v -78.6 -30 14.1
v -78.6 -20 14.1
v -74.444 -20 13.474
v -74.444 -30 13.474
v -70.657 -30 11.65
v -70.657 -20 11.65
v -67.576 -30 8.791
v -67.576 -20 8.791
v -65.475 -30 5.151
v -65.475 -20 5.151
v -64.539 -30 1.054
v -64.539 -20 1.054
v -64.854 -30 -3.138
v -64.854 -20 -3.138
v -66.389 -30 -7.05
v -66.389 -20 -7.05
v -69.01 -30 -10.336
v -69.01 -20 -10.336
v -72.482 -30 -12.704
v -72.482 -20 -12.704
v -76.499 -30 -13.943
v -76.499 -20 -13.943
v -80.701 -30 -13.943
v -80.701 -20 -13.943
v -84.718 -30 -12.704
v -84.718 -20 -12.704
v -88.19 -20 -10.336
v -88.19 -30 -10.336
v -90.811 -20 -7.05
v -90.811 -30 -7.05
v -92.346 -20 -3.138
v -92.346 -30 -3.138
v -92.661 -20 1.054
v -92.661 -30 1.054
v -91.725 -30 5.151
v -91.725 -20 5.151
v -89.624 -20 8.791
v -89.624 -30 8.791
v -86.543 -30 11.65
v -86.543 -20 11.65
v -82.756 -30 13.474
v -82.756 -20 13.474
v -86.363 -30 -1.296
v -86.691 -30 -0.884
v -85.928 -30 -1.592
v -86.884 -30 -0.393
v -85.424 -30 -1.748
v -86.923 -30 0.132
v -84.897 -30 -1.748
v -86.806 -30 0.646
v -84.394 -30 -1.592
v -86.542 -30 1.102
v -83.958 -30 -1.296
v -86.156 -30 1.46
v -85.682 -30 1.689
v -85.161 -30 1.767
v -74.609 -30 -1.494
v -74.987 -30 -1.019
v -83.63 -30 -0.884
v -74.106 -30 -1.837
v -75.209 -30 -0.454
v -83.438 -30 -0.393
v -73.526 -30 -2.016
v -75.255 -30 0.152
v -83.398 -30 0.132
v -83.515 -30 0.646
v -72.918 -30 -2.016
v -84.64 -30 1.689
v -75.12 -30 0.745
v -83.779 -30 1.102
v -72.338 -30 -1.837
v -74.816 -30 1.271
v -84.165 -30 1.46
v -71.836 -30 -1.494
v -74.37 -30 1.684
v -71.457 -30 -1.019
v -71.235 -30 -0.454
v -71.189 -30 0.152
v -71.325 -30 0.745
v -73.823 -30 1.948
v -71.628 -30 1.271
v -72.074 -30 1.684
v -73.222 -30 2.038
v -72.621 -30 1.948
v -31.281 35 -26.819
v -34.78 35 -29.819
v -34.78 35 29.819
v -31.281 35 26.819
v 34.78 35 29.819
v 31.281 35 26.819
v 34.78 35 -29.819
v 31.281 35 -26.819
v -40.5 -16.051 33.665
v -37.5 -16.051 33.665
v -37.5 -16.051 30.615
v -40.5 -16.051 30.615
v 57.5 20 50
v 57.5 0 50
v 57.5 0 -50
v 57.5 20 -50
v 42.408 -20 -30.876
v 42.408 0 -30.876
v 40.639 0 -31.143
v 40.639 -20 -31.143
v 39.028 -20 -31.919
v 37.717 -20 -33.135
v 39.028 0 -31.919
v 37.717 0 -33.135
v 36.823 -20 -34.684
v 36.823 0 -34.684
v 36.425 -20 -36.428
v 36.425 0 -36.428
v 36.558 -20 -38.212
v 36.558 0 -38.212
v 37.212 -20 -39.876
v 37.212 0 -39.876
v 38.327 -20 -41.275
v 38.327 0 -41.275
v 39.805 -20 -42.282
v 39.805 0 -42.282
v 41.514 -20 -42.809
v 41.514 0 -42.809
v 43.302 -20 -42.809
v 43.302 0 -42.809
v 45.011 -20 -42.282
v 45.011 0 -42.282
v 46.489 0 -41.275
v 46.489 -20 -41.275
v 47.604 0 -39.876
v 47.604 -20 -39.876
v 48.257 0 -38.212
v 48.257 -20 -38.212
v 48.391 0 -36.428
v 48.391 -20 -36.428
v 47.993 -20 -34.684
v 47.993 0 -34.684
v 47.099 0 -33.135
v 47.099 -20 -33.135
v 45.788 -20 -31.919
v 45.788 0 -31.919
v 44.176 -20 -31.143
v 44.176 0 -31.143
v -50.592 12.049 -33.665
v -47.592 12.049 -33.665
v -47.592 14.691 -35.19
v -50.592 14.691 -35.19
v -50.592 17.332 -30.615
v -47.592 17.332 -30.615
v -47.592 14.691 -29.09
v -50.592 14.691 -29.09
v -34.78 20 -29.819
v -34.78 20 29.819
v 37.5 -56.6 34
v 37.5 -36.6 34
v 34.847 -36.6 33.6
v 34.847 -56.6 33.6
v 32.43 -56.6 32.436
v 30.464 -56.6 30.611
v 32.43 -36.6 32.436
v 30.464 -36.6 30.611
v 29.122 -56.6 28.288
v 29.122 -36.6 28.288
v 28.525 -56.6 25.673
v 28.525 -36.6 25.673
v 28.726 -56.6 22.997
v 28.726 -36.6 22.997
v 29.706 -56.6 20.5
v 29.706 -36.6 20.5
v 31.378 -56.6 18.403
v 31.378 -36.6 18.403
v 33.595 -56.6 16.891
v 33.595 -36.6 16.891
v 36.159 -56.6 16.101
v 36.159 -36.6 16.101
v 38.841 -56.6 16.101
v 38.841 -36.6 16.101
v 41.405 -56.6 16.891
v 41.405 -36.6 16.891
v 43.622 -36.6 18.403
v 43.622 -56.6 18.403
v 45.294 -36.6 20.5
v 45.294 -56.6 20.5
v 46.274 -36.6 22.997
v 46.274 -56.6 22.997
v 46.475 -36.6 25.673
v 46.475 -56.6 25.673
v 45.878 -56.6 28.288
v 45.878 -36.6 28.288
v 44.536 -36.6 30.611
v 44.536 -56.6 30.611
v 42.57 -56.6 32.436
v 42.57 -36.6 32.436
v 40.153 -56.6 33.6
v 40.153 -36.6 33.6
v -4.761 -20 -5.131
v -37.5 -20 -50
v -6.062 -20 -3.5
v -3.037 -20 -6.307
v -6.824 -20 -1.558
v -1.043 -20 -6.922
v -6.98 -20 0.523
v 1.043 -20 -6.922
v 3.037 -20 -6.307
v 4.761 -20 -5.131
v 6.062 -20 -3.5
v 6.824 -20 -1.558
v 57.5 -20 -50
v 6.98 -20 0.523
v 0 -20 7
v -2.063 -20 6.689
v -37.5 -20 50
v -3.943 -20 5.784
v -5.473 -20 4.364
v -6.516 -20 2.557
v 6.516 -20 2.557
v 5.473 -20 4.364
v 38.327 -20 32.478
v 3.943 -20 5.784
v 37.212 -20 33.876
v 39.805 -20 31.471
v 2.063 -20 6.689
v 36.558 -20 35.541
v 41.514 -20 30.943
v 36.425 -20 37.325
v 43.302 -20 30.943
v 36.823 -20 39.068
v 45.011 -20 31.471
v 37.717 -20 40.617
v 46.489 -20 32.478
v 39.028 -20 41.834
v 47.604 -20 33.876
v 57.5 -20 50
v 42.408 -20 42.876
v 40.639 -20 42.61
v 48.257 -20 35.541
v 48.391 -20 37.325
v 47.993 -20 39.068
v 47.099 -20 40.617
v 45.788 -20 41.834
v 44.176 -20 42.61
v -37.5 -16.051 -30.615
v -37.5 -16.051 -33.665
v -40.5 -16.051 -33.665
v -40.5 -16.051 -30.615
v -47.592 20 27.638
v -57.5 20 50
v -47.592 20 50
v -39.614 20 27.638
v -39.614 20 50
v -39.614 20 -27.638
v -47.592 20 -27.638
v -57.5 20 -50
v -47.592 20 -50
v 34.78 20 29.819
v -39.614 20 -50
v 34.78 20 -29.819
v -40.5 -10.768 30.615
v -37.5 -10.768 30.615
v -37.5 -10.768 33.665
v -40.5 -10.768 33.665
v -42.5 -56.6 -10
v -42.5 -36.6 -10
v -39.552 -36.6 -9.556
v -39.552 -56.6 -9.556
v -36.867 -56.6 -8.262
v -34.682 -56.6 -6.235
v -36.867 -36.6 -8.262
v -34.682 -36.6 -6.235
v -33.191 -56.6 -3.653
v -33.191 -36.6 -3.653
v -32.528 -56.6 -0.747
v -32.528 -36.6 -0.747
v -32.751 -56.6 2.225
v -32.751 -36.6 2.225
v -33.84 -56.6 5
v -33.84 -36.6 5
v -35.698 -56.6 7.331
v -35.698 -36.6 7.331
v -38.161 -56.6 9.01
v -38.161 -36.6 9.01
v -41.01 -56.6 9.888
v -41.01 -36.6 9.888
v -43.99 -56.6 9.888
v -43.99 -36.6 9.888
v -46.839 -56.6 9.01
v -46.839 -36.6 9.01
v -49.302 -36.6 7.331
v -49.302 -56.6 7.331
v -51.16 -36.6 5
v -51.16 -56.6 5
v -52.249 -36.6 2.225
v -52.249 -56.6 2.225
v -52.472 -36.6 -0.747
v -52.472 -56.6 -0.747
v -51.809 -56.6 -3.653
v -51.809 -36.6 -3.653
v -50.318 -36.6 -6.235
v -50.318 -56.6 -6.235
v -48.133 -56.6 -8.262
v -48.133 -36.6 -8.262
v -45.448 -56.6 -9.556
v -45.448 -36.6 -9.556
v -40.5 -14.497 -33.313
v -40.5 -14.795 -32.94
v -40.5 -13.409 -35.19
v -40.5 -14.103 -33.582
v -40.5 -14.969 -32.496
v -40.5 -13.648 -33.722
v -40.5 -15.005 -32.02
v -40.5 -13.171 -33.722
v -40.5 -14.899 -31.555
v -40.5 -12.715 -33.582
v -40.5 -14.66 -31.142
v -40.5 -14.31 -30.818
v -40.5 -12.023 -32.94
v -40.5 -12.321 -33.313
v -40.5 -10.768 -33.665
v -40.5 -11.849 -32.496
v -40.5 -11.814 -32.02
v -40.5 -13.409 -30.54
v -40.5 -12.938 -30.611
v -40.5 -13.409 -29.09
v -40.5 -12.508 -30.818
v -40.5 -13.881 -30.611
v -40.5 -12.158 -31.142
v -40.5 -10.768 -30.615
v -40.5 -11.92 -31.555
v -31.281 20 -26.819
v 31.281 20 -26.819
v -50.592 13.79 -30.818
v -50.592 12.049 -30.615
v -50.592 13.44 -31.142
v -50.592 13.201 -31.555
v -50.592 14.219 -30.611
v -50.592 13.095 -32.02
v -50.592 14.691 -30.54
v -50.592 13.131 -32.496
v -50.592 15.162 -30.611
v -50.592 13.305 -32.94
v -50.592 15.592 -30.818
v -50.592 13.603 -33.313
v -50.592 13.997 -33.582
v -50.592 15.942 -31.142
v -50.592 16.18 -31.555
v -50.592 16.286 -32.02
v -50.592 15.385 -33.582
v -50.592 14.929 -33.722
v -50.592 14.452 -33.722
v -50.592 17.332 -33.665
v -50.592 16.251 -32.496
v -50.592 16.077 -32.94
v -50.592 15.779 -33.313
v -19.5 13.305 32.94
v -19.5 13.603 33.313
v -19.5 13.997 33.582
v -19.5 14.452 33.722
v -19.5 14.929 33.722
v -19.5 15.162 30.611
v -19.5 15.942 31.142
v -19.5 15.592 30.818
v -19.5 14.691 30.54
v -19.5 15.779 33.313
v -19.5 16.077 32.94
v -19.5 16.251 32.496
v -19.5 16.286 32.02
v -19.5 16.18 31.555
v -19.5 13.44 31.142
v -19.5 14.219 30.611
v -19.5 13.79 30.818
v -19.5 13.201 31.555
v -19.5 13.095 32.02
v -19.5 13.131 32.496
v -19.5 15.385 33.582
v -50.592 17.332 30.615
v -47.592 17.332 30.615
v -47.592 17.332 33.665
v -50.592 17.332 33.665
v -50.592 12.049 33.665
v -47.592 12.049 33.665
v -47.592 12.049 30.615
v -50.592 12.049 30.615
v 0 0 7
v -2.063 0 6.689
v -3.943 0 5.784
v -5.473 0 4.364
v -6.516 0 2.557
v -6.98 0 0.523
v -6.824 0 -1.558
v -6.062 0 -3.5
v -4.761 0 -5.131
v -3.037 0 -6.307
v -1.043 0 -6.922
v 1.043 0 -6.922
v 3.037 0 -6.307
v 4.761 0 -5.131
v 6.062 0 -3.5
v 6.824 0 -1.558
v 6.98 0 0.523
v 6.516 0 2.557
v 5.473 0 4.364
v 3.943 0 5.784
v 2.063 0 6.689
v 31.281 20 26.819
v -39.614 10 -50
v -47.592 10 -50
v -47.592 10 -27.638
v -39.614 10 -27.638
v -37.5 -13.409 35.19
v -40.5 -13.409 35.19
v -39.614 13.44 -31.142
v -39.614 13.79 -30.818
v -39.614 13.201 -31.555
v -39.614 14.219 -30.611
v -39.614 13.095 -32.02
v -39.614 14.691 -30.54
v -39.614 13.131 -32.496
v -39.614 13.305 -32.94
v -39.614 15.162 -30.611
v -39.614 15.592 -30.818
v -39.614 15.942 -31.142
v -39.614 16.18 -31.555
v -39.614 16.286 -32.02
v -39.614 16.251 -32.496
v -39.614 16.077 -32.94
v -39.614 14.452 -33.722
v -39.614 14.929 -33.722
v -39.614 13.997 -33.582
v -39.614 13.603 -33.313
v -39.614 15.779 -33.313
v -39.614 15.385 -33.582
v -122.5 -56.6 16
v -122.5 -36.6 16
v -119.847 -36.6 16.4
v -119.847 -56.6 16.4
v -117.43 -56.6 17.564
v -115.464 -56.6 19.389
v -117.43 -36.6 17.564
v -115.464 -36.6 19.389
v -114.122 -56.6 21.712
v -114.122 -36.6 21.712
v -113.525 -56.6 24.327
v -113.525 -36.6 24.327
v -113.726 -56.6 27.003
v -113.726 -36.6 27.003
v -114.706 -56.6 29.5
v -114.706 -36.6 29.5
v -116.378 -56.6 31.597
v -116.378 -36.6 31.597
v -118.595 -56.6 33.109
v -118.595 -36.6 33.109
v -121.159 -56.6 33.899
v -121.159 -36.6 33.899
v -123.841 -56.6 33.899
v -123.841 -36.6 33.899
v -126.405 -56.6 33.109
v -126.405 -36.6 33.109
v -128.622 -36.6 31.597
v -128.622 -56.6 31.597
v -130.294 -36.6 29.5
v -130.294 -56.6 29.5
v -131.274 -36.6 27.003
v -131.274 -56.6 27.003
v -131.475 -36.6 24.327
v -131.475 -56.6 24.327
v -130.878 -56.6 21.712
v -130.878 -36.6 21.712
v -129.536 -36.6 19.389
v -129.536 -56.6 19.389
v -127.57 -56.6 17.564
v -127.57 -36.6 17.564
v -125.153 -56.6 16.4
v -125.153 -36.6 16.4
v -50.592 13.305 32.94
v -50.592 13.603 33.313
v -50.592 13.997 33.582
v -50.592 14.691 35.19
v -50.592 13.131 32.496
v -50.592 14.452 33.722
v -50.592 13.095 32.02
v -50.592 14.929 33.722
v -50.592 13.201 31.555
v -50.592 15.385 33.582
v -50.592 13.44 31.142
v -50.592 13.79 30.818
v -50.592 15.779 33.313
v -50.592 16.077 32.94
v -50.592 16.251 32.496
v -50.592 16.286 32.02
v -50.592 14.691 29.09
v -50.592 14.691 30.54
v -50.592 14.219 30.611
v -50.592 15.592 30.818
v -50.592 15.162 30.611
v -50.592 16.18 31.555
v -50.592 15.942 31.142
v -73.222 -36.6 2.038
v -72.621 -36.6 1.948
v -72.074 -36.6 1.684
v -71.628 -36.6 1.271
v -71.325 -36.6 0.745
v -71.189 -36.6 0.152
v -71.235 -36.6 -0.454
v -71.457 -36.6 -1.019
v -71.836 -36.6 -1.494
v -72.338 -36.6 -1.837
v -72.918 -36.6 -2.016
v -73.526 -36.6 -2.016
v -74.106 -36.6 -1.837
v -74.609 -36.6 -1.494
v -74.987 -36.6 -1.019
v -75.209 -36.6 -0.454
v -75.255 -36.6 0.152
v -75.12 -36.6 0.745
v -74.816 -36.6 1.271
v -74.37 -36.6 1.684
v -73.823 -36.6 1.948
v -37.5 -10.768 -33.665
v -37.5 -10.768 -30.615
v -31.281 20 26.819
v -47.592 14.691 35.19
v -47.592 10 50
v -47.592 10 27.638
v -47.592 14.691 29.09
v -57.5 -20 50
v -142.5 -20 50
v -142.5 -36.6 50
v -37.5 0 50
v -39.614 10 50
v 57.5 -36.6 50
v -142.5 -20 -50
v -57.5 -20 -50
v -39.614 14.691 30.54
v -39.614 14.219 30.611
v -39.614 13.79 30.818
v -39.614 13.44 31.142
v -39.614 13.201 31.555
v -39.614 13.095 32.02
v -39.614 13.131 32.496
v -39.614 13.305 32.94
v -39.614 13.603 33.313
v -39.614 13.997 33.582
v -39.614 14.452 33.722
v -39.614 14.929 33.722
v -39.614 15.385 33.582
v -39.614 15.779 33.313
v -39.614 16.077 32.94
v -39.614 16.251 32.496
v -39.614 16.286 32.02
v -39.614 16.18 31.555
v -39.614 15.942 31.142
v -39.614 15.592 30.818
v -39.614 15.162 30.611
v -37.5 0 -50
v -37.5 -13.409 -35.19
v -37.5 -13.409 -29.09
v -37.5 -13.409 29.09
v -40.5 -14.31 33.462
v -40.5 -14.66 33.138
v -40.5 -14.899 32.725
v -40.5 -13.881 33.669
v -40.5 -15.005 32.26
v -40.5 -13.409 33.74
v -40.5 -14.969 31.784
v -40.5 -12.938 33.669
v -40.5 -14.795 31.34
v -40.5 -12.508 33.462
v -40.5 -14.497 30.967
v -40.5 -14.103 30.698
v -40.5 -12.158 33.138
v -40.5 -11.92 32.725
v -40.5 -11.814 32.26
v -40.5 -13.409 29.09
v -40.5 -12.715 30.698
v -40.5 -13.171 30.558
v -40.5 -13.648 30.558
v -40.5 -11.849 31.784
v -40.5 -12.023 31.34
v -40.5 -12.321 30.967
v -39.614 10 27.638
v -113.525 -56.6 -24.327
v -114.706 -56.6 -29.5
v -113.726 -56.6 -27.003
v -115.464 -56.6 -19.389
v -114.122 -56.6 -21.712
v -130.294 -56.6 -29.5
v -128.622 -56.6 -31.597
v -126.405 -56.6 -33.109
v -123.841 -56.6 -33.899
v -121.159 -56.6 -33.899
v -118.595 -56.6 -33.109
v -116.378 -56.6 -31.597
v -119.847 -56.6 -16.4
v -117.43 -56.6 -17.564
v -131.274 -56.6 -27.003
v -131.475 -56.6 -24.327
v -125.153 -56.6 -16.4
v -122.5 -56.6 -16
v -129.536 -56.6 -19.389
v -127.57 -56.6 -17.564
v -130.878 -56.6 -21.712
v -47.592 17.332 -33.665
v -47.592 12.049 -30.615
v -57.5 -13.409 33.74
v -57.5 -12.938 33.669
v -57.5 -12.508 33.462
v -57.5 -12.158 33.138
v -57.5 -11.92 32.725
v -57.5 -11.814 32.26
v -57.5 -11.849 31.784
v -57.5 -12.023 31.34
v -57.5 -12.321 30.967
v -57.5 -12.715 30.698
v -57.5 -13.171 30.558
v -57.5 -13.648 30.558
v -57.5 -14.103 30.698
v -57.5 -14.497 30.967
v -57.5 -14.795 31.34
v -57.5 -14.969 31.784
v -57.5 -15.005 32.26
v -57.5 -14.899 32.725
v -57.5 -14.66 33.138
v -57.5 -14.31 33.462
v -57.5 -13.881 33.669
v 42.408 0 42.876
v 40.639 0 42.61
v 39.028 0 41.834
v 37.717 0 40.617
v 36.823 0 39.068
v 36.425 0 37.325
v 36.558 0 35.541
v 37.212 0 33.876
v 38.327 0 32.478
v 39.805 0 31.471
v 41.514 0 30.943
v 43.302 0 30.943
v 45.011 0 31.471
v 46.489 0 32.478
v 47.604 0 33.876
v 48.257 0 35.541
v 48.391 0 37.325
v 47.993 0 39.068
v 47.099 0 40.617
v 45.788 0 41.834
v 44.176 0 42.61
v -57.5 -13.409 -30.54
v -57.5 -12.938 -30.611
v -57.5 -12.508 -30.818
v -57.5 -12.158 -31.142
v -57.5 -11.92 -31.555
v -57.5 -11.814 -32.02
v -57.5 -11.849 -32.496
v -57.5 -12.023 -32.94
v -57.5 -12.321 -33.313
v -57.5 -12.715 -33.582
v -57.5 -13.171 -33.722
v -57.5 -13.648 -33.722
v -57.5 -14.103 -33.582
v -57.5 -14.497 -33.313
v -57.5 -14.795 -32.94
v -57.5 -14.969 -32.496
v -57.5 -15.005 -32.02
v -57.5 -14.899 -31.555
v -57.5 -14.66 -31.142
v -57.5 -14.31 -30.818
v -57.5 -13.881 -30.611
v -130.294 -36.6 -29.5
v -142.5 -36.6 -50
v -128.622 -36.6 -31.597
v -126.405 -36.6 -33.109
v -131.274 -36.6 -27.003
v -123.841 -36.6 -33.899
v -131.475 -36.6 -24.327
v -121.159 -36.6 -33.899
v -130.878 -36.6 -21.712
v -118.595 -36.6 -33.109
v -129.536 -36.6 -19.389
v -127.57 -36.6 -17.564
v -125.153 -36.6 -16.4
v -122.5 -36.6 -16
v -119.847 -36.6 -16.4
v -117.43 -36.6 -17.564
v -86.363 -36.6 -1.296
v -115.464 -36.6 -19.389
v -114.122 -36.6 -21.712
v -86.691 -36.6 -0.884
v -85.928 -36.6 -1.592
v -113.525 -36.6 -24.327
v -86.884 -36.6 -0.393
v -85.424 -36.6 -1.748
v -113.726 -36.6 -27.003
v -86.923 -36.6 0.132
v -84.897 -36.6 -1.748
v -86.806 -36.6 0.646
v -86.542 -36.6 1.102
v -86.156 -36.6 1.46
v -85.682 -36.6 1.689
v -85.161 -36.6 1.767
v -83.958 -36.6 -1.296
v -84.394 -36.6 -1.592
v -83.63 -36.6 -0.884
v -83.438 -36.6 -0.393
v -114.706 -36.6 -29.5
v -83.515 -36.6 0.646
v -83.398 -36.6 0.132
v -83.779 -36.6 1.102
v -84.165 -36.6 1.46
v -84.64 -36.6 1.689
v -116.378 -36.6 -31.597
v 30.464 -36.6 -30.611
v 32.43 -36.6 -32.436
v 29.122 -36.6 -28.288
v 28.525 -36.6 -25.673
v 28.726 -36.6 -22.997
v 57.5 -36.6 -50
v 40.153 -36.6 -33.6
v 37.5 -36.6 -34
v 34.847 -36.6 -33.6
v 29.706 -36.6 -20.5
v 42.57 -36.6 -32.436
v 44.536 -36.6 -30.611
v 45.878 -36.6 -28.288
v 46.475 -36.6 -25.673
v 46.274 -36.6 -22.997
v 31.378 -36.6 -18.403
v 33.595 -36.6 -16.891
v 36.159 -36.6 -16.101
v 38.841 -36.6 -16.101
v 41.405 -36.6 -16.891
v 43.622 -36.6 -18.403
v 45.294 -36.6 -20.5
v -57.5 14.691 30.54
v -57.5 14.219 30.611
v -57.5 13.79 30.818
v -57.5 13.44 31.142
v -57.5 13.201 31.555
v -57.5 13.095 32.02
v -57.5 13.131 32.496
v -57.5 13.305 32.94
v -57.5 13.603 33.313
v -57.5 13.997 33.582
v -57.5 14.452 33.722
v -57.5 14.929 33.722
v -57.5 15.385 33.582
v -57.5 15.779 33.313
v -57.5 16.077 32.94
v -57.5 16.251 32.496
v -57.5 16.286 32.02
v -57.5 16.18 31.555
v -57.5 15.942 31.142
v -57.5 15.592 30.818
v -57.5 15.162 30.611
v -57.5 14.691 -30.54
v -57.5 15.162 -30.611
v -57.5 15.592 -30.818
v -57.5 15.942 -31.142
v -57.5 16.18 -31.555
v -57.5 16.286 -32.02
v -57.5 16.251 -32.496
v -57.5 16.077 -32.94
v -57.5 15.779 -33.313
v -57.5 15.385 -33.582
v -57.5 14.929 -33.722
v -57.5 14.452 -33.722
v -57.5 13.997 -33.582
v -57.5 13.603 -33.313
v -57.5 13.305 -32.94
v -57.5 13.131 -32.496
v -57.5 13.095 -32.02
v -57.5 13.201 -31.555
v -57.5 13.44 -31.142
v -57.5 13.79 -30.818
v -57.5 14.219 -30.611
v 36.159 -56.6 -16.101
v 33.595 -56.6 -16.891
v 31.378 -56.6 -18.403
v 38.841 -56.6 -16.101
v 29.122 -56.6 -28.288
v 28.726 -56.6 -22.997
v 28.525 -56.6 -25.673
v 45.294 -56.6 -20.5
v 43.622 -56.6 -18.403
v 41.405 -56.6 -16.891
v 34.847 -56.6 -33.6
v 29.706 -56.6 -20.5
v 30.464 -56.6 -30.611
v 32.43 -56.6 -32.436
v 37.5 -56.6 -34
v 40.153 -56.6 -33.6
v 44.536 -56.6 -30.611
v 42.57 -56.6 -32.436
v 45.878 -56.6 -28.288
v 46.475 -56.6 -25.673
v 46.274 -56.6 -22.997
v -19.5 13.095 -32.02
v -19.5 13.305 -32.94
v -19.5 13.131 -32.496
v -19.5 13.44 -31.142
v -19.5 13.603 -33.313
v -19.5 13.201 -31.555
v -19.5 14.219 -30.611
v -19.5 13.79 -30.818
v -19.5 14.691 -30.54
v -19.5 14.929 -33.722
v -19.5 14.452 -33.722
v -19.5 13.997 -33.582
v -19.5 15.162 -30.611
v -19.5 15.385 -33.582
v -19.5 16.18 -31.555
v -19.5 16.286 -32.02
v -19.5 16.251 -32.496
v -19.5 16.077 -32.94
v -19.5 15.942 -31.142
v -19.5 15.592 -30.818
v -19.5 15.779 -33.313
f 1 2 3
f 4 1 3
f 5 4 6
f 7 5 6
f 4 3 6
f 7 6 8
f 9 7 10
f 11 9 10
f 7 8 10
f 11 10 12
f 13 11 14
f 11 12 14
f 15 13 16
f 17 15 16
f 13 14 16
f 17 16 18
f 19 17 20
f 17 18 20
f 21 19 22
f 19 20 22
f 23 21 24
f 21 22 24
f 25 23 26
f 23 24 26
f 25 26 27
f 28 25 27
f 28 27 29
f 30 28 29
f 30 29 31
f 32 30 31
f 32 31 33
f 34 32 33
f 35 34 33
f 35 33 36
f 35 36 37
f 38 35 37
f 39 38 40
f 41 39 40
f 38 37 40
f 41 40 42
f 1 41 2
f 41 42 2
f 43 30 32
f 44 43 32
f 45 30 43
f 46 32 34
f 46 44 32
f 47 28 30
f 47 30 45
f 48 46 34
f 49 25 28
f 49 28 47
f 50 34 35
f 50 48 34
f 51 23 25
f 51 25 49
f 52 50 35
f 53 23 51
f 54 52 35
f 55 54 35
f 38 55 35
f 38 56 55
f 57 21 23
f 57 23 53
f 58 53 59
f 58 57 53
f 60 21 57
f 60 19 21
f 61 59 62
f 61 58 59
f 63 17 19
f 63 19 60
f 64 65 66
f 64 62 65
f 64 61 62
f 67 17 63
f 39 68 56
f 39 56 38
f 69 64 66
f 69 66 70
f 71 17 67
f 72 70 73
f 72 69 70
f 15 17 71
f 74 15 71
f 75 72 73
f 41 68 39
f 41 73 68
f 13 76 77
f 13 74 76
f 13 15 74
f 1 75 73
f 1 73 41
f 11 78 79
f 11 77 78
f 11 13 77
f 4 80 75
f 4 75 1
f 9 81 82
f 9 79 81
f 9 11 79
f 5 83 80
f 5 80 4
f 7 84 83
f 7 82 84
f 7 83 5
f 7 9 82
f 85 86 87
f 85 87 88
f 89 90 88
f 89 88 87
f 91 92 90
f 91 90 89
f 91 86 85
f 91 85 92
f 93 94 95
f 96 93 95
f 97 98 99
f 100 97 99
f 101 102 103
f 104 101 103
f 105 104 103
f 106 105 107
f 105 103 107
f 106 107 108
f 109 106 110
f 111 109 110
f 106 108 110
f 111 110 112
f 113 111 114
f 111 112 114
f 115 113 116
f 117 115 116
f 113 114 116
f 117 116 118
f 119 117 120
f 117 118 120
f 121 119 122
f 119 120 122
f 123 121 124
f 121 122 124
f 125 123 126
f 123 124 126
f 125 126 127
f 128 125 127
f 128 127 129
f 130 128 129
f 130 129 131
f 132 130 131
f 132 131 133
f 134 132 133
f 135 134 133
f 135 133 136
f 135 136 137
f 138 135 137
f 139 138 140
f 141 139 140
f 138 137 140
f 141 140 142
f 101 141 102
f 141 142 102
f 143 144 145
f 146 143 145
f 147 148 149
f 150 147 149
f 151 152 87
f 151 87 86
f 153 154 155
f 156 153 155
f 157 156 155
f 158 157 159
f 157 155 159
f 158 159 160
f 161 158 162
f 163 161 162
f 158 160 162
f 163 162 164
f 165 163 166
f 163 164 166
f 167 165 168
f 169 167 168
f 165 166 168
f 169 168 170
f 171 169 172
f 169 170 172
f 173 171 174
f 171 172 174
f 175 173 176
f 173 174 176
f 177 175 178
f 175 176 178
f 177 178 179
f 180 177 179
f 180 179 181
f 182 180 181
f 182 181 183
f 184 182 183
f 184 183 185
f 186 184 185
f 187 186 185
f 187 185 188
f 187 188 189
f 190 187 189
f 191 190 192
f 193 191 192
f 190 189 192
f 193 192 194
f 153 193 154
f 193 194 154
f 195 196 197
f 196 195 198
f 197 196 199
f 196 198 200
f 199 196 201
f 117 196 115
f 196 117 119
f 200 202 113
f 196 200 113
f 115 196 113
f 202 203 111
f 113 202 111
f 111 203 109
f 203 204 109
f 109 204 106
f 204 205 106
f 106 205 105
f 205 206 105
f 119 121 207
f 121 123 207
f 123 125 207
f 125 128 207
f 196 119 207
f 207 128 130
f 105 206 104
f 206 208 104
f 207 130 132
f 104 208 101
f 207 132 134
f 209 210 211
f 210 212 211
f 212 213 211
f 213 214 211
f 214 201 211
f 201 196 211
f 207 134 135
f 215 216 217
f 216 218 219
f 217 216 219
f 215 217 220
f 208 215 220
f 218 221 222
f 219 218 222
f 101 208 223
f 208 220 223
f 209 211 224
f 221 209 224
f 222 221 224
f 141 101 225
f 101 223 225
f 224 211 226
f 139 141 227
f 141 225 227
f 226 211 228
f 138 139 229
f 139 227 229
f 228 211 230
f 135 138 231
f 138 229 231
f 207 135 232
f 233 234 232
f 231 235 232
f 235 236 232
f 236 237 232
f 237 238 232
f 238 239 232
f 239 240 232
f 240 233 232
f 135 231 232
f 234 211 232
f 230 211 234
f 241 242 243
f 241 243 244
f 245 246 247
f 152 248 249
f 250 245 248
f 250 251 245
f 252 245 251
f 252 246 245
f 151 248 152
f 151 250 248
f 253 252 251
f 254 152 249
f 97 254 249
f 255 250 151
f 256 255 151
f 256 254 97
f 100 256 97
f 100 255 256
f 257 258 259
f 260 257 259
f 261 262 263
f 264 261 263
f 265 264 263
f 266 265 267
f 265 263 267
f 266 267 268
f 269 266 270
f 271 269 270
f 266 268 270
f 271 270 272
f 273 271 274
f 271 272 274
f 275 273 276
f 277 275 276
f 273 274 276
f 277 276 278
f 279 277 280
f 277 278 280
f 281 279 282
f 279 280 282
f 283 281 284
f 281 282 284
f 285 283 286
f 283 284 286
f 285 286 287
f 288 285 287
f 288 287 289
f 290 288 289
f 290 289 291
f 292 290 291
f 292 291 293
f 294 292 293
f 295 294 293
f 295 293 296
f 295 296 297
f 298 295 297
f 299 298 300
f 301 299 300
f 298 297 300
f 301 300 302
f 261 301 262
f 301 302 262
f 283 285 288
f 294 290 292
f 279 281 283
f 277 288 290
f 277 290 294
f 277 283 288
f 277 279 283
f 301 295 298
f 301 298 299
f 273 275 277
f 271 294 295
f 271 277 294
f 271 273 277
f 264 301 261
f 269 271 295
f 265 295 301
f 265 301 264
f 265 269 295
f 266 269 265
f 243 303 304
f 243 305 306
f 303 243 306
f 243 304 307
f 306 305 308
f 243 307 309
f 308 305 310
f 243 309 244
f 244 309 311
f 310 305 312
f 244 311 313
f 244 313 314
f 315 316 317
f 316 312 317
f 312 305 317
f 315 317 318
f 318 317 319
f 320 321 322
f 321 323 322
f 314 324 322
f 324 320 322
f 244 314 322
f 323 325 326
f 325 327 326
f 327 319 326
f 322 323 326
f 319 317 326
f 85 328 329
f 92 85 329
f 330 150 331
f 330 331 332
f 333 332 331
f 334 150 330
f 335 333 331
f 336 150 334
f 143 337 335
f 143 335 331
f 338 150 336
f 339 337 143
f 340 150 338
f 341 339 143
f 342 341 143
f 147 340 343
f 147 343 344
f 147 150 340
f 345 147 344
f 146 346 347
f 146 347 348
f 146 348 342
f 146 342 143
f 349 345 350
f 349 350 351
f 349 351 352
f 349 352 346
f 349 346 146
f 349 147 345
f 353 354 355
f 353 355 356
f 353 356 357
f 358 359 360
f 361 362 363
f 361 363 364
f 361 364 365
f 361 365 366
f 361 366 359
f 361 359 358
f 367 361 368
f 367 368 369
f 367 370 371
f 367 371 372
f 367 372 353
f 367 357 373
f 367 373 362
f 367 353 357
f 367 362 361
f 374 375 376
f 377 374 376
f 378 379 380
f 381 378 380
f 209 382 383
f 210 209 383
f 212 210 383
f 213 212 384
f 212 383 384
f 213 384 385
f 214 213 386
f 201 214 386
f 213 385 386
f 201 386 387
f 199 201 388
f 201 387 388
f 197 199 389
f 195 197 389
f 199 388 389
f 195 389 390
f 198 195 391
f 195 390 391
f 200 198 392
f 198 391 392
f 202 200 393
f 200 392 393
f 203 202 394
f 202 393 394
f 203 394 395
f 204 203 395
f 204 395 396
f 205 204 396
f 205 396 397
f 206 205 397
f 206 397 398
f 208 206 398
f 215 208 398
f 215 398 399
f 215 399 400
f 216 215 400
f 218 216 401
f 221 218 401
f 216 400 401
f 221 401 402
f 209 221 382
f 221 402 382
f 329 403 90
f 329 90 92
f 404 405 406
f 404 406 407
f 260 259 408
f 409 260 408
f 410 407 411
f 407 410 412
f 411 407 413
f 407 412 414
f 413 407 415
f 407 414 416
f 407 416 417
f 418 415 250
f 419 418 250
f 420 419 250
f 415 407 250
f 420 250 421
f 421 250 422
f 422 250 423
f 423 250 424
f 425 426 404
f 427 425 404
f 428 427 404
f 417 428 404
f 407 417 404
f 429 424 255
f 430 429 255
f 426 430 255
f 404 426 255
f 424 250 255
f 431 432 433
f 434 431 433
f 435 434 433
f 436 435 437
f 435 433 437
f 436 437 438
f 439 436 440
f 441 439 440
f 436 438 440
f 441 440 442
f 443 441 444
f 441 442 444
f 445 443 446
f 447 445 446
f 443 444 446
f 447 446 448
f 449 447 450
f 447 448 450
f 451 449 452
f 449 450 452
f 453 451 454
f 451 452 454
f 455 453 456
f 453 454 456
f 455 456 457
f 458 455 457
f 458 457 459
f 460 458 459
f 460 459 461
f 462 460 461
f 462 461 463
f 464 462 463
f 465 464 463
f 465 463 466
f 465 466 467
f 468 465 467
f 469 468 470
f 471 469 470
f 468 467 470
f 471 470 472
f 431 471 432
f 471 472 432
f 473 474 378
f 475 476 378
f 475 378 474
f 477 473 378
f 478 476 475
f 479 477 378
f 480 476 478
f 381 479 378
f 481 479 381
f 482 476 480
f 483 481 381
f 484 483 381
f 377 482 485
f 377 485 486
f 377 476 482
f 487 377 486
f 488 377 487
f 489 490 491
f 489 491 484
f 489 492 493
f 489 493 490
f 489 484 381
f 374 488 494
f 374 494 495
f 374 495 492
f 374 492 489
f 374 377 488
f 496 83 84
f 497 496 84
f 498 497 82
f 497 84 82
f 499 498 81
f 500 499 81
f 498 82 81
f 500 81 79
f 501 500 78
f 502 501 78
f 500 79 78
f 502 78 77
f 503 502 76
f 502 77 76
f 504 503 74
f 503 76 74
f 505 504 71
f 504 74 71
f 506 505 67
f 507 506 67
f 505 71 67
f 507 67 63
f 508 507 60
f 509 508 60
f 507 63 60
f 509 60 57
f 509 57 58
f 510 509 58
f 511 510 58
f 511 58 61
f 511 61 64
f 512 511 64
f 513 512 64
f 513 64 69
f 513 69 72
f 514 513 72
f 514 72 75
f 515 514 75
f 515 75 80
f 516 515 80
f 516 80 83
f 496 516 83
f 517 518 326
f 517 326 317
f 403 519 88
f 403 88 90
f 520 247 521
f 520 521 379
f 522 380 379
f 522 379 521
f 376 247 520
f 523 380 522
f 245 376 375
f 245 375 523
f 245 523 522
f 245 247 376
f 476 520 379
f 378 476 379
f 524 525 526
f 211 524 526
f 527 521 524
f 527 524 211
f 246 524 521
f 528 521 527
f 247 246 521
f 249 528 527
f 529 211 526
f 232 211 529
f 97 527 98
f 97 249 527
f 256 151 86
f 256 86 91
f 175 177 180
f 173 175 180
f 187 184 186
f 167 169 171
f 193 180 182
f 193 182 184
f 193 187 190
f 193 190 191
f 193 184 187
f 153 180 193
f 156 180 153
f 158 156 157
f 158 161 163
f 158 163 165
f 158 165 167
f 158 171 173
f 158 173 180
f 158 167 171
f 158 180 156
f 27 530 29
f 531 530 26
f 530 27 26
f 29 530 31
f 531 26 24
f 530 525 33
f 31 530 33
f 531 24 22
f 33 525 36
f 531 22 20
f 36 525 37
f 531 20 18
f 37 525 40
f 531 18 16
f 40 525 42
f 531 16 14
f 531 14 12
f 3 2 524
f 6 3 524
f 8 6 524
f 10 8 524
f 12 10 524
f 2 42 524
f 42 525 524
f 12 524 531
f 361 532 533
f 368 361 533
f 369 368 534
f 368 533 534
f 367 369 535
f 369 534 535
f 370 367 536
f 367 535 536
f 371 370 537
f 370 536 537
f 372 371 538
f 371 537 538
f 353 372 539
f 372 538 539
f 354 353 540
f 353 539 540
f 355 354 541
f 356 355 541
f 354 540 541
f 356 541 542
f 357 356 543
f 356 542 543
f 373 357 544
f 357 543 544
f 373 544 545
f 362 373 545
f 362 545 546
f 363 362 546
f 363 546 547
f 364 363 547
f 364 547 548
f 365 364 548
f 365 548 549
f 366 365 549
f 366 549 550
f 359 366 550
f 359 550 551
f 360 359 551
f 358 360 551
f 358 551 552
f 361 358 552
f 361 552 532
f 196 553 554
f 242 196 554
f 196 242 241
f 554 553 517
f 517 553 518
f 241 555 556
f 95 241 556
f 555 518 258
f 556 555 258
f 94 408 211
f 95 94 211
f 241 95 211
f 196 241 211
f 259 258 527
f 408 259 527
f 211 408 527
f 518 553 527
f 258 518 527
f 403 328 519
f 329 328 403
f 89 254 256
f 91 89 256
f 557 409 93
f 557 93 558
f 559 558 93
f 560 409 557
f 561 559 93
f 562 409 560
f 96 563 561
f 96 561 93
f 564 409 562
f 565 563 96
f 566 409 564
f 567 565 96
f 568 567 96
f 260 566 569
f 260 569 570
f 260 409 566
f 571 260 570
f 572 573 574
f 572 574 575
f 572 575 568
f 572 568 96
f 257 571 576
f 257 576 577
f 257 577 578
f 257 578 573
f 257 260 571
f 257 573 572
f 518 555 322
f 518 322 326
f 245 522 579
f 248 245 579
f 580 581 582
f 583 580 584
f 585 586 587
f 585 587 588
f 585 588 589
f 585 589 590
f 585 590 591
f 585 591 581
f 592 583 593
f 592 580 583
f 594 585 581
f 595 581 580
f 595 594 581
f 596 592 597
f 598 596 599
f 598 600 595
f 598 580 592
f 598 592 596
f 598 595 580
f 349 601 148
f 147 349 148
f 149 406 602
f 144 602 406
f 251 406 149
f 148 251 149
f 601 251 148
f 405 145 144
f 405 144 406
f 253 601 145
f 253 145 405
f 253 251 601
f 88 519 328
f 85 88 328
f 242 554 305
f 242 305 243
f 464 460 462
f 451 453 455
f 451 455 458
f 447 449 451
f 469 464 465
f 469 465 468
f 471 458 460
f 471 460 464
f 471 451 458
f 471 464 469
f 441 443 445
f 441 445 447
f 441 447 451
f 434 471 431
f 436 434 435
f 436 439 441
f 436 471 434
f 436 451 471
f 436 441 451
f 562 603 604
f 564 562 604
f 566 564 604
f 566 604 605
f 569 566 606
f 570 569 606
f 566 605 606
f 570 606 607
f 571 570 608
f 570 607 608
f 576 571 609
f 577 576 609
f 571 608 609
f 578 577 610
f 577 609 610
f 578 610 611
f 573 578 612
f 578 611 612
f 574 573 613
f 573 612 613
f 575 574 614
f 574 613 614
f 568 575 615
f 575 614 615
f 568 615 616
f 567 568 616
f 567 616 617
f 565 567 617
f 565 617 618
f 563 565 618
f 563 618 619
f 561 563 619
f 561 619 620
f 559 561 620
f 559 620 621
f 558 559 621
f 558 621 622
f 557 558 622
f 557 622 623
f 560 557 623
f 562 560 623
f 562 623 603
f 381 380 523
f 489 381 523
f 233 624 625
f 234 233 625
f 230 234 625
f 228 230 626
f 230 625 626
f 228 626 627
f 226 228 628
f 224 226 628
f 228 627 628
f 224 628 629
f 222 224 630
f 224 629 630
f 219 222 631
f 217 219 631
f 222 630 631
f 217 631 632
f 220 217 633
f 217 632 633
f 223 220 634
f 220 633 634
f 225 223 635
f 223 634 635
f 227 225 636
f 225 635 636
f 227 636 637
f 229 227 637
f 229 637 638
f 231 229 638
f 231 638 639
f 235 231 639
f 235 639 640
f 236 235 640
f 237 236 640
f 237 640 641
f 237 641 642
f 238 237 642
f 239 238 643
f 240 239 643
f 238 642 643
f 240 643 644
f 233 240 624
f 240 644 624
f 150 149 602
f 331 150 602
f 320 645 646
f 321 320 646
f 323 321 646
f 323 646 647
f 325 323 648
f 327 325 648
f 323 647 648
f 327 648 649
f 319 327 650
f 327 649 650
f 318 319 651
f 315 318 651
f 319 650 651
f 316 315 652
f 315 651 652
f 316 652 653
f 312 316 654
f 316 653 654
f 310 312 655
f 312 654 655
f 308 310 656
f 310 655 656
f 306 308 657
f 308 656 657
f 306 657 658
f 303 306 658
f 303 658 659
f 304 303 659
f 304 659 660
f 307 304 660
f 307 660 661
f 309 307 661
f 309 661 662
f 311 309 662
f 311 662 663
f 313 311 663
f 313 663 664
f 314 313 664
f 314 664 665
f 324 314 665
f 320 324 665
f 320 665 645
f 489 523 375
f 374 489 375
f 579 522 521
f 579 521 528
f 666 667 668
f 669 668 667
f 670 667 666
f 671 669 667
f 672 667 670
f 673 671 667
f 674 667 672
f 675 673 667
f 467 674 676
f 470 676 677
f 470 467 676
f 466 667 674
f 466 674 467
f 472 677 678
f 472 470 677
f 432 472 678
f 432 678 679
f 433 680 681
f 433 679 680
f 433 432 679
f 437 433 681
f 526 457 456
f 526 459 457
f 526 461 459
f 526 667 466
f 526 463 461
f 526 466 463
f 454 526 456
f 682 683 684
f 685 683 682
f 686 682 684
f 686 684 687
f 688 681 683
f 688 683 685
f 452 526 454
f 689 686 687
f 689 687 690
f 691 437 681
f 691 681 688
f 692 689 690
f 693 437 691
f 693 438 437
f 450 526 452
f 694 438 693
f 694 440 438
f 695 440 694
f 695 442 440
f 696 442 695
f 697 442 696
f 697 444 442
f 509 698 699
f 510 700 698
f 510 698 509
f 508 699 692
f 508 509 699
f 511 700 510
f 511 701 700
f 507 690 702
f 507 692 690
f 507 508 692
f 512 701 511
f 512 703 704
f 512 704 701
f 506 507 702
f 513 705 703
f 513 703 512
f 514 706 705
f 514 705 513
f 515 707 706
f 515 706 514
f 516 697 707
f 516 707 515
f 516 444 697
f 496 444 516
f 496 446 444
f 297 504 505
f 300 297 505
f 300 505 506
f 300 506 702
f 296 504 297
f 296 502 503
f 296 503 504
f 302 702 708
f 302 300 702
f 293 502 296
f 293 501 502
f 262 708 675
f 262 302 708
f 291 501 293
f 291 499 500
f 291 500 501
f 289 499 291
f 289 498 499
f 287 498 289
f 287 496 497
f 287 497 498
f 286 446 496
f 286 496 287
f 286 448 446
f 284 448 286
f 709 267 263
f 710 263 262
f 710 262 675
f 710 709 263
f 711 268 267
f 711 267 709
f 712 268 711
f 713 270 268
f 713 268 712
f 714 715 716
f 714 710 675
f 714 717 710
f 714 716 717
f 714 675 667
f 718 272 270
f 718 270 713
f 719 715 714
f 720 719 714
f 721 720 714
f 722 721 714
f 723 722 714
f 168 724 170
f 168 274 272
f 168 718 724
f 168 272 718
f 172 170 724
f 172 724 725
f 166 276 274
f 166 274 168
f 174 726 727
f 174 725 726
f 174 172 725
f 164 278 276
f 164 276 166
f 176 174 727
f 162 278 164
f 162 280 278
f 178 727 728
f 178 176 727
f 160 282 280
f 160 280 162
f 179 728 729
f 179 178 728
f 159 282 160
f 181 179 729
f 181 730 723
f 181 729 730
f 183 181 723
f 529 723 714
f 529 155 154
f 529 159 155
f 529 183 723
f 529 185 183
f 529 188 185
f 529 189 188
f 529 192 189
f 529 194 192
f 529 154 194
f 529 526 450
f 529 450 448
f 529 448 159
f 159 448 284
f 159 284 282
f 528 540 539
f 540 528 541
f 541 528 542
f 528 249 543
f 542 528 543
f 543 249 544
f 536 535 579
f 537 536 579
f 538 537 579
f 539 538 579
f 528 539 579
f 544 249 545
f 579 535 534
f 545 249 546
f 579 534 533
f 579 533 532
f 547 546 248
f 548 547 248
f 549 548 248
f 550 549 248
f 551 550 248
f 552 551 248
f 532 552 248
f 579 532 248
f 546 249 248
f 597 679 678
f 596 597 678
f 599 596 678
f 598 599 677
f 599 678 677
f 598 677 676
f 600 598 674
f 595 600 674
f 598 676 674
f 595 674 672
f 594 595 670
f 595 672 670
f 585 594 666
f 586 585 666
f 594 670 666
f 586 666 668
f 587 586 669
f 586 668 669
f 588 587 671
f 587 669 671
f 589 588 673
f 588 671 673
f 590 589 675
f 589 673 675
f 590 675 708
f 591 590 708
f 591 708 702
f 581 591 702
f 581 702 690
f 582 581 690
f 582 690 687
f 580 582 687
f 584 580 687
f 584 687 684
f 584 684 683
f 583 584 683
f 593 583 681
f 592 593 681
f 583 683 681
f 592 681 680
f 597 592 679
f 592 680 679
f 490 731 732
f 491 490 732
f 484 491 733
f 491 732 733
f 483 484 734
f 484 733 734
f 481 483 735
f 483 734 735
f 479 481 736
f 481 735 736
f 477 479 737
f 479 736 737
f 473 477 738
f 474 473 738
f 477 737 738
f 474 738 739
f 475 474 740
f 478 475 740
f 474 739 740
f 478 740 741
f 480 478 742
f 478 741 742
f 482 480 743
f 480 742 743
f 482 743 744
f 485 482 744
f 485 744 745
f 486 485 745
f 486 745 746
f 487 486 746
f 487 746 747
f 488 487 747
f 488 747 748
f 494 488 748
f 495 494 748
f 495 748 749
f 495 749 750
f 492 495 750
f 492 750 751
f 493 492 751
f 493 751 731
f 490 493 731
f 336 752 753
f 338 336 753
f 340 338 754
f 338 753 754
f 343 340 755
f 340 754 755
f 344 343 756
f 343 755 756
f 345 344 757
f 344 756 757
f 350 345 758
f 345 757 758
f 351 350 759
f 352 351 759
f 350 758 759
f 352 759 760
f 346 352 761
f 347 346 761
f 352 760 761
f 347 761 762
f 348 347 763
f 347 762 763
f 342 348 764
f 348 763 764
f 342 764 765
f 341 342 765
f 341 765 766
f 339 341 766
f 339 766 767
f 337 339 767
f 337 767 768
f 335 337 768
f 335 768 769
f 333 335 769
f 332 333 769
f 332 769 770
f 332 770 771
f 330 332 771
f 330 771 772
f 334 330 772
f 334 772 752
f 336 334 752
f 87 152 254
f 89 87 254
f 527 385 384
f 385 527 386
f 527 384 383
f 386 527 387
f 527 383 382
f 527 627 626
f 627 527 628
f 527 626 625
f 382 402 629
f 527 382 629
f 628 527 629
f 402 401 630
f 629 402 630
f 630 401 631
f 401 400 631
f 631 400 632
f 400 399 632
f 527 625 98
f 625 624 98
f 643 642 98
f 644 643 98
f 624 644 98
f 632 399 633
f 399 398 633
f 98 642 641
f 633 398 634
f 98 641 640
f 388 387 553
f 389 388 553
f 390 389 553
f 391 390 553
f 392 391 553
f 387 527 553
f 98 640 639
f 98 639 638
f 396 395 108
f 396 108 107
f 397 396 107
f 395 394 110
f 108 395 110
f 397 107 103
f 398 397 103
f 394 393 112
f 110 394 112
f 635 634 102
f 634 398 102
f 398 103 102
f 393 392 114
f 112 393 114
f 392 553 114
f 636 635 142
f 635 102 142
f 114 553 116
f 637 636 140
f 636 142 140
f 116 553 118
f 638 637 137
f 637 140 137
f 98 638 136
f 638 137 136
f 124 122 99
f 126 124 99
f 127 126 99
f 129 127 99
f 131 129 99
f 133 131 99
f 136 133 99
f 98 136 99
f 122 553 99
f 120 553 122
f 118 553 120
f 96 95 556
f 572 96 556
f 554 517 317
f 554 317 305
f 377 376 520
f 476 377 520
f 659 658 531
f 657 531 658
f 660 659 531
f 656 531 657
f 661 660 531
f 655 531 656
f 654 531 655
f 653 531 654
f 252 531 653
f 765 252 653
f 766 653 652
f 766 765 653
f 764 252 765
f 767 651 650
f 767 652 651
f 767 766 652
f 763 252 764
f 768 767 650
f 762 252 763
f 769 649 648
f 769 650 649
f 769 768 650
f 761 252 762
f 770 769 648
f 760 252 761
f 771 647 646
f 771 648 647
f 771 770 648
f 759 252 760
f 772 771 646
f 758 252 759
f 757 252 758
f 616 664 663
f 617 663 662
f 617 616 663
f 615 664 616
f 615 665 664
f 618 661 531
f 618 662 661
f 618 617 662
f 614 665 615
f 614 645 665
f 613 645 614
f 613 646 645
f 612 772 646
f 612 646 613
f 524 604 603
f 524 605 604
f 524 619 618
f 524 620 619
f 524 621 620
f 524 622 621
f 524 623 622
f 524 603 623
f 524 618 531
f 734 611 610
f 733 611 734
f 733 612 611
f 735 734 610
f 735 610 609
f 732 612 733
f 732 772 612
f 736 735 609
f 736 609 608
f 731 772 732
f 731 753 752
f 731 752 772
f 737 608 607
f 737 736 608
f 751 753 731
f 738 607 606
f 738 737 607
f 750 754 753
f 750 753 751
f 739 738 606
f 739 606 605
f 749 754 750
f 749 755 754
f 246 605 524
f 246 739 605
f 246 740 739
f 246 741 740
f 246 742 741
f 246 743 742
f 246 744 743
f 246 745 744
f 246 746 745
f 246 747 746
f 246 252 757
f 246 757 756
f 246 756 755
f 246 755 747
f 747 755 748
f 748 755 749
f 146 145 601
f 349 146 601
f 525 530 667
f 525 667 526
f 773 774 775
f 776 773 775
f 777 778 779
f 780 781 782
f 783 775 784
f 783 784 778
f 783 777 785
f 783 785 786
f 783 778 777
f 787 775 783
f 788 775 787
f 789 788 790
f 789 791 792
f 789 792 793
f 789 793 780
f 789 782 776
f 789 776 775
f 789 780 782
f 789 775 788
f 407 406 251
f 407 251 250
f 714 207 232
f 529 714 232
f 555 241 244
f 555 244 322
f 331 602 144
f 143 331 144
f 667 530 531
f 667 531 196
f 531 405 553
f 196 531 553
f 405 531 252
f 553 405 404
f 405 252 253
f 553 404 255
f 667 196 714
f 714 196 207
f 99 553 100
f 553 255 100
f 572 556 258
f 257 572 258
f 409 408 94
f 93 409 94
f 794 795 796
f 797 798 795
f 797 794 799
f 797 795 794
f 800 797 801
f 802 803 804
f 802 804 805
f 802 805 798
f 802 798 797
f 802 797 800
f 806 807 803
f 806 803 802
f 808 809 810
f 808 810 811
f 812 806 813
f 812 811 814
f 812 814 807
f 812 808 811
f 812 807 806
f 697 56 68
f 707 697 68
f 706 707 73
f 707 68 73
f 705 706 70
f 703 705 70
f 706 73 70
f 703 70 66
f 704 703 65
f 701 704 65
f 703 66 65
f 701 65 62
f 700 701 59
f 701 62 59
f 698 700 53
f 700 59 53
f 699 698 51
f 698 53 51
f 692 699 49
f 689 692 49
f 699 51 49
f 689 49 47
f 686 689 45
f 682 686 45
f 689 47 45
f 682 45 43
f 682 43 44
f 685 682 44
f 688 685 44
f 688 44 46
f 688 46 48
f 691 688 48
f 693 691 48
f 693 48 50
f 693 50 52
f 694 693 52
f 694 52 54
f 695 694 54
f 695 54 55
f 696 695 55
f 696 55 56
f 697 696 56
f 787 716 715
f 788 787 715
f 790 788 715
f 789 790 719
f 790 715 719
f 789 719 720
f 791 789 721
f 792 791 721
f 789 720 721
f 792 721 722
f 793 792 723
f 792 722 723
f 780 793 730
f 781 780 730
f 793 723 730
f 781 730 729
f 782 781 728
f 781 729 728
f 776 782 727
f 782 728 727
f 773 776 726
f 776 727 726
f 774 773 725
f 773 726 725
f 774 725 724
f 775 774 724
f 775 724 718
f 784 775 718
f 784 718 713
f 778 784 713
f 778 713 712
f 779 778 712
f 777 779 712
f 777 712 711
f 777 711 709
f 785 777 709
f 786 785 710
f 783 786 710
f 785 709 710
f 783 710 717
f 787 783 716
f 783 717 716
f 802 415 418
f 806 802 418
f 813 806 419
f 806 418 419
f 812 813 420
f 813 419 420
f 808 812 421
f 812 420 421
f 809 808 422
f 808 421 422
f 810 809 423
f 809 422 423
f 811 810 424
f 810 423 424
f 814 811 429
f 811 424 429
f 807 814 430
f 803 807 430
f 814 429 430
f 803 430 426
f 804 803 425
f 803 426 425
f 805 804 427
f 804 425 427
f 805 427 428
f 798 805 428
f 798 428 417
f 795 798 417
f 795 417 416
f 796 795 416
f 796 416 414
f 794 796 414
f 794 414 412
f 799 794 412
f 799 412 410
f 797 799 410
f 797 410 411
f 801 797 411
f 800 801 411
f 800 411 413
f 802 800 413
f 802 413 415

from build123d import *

# Parameters (mm, degrees)
SKETCH1_W            = 115
SKETCH1_H            = 100
BOSS_EXTRUDE1_DEPTH  = 20
SKETCH8_R            = 7
SKETCH8_R_2          = 6
BOSS_EXTRUDE4_DEPTH  = 20
SKETCH9_W            = 200
SKETCH9_H            = 100
BOSS_EXTRUDE5_DEPTH  = 16.6
SKETCH10_R           = 9
SKETCH10_R_2         = 10
BOSS_EXTRUDE7_DEPTH  = 20
SKETCH11_W           = 69.56
SKETCH11_H           = 59.638518518
SKETCH11_W_2         = 62.561838236
SKETCH11_H_2         = 53.638518518
BOSS_EXTRUDE9_DEPTH  = 15
SKETCH17_W           = 20
SKETCH17_H           = 100
BOSS_EXTRUDE15_DEPTH = 20
SKETCH15_R           = 14.1
CUT_EXTRUDE2_DEPTH   = 10
SKETCH21_R           = 1.76744544
SKETCH21_R_2         = 2.038433248
CUT_EXTRUDE3_DEPTH   = 20
SKETCH19_R           = 1.6
CUT_EXTRUDE4_DEPTH   = 38
CUT_EXTRUDE5_DEPTH   = 3
SKETCH23_W           = 7.97749669
SKETCH23_H           = 22.361861783
CUT_EXTRUDE6_DEPTH   = 10
CUT_EXTRUDE7_DEPTH   = 3
CUT_EXTRUDE8_DEPTH   = 3


with BuildPart() as part:
    # Sketch1 → Boss-Extrude1 (new body)
    with BuildSketch(Plane(origin=(0, 0, 0), x_dir=(1, 0, 0), z_dir=(0, 1, 0))):
        Rectangle(SKETCH1_W, SKETCH1_H)
    extrude(amount=BOSS_EXTRUDE1_DEPTH)

    # Sketch8 → Boss-Extrude4 (add)
    with BuildSketch(Plane.XZ):
        with Locations(Location((0, 0, 0), (0, 0, 90))):
            Circle(SKETCH8_R)
        with Locations(Location((42.407889557, -36.876425702, 0), (0, 0, 90))):
            Circle(SKETCH8_R_2)
        with Locations(Location((42.407889557, 36.876425702, 0), (0, 0, 90))):
            Circle(SKETCH8_R_2)
    extrude(amount=BOSS_EXTRUDE4_DEPTH)

    # Sketch9 → Boss-Extrude5 (add)
    with BuildSketch(Plane.XZ.offset(20)):
        with Locations((-42.5, 0)):
            Rectangle(SKETCH9_W, SKETCH9_H)
    extrude(amount=BOSS_EXTRUDE5_DEPTH)

    # Sketch10 → Boss-Extrude7 (add)
    with BuildSketch(Plane.XZ.offset(36.6)):
        with Locations(Location((37.5, -25, 0), (0, 0, 270))):
            Circle(SKETCH10_R)
        with Locations(Location((-122.5, -25, 0), (0, 0, 90))):
            Circle(SKETCH10_R)
        with Locations(Location((-122.5, 25, 0), (0, 0, 270))):
            Circle(SKETCH10_R)
        with Locations(Location((37.5, 25, 0), (0, 0, 90))):
            Circle(SKETCH10_R)
        with Locations(Location((-42.5, 0, 0), (0, 0, 270))):
            Circle(SKETCH10_R_2)
    extrude(amount=BOSS_EXTRUDE7_DEPTH)

    # Sketch11 → Boss-Extrude9 (add)
    with BuildSketch(Plane(origin=(0, 20, 0), x_dir=(1, 0, 0), z_dir=(0, 1, 0))):
        Rectangle(SKETCH11_W, SKETCH11_H)
        Rectangle(SKETCH11_W_2, SKETCH11_H_2, mode=Mode.SUBTRACT)
    extrude(amount=BOSS_EXTRUDE9_DEPTH)

    # Sketch17 → Boss-Extrude15 (add)
    with BuildSketch(Plane.XZ):
        with Locations((-47.5, 0)):
            Rectangle(SKETCH17_W, SKETCH17_H)
    extrude(amount=BOSS_EXTRUDE15_DEPTH)

    # Sketch15 → Cut-Extrude2 (cut)
    with BuildSketch(Plane(origin=(0, -20, 0), x_dir=(1, 0, 0), z_dir=(0, 1, 0))):
        with Locations(Location((-78.6, 0, 0), (0, 0, 270))):
            Circle(SKETCH15_R)
    extrude(amount=-CUT_EXTRUDE2_DEPTH, mode=Mode.SUBTRACT)

    # Sketch21 → Cut-Extrude3 (cut)
    with BuildSketch(Plane(origin=(0, -30, 0), x_dir=(1, 0, 0), z_dir=(0, 1, 0))):
        with Locations(Location((-85.16065049, 0, 0), (0, 0, 270))):
            Circle(SKETCH21_R)
        with Locations(Location((-73.222056531, 0, 0), (0, 0, 270))):
            Circle(SKETCH21_R_2)
    extrude(amount=-CUT_EXTRUDE3_DEPTH, mode=Mode.SUBTRACT)

    # Sketch19 → Cut-Extrude4 (cut)
    with BuildSketch(Plane.ZY.offset(57.5)):
        with Locations((-32.14, -13.409140004)):
            Circle(SKETCH19_R)
        with Locations((32.14, -13.409140004)):
            Circle(SKETCH19_R)
        with Locations((-32.14, 14.690859996)):
            Circle(SKETCH19_R)
        with Locations(Location((32.14, 14.690859996, 0), (0, 0, 180))):
            Circle(SKETCH19_R)
    extrude(amount=-CUT_EXTRUDE4_DEPTH, mode=Mode.SUBTRACT)

    # Sketch22 → Cut-Extrude5 (cut)
    with BuildSketch(Plane(origin=(-37.5, 0, 0), x_dir=(0, 0, -1), z_dir=(1, 0, 0))):
        Polygon((-29.09, -13.409140004), (-30.615, -10.767762522), (-33.665, -10.767762522), (-35.19, -13.409140004), (-33.665, -16.050517485), (-30.615, -16.050517485), align=None)
        Polygon((30.615, -16.050517485), (29.09, -13.409140004), (30.615, -10.767762522), (33.665, -10.767762522), (35.19, -13.409140004), (33.665, -16.050517485), align=None)
    extrude(amount=-CUT_EXTRUDE5_DEPTH, mode=Mode.SUBTRACT)

    # Sketch23 → Cut-Extrude6 (cut)
    with BuildSketch(Plane(origin=(0, 20, 0), x_dir=(1, 0, 0), z_dir=(0, 1, 0))):
        with Locations((-43.602813804, -38.819069109)):
            Rectangle(SKETCH23_W, SKETCH23_H)
        with Locations((-43.602813804, 38.819069109)):
            Rectangle(SKETCH23_W, SKETCH23_H)
    extrude(amount=-CUT_EXTRUDE6_DEPTH, mode=Mode.SUBTRACT)

    # Sketch24 → Cut-Extrude7 (cut)
    with BuildSketch(Plane(origin=(-47.591562149, 0, 0), x_dir=(0, 0, -1), z_dir=(1, 0, 0))):
        Polygon((-33.665, 17.332237478), (-35.19, 14.690859996), (-33.665, 12.049482515), (-30.615, 12.049482515), (-29.09, 14.690859996), (-30.615, 17.332237478), align=None)
    extrude(amount=-CUT_EXTRUDE7_DEPTH, mode=Mode.SUBTRACT)

    # Sketch25 → Cut-Extrude8 (cut)
    with BuildSketch(Plane(origin=(-47.591562149, 0, 0), x_dir=(0, 0, -1), z_dir=(1, 0, 0))):
        Polygon((35.19, 14.690859996), (33.665, 17.332237478), (30.615, 17.332237478), (29.09, 14.690859996), (30.615, 12.049482515), (33.665, 12.049482515), align=None)
    extrude(amount=-CUT_EXTRUDE8_DEPTH, mode=Mode.SUBTRACT)


solid = part.part
